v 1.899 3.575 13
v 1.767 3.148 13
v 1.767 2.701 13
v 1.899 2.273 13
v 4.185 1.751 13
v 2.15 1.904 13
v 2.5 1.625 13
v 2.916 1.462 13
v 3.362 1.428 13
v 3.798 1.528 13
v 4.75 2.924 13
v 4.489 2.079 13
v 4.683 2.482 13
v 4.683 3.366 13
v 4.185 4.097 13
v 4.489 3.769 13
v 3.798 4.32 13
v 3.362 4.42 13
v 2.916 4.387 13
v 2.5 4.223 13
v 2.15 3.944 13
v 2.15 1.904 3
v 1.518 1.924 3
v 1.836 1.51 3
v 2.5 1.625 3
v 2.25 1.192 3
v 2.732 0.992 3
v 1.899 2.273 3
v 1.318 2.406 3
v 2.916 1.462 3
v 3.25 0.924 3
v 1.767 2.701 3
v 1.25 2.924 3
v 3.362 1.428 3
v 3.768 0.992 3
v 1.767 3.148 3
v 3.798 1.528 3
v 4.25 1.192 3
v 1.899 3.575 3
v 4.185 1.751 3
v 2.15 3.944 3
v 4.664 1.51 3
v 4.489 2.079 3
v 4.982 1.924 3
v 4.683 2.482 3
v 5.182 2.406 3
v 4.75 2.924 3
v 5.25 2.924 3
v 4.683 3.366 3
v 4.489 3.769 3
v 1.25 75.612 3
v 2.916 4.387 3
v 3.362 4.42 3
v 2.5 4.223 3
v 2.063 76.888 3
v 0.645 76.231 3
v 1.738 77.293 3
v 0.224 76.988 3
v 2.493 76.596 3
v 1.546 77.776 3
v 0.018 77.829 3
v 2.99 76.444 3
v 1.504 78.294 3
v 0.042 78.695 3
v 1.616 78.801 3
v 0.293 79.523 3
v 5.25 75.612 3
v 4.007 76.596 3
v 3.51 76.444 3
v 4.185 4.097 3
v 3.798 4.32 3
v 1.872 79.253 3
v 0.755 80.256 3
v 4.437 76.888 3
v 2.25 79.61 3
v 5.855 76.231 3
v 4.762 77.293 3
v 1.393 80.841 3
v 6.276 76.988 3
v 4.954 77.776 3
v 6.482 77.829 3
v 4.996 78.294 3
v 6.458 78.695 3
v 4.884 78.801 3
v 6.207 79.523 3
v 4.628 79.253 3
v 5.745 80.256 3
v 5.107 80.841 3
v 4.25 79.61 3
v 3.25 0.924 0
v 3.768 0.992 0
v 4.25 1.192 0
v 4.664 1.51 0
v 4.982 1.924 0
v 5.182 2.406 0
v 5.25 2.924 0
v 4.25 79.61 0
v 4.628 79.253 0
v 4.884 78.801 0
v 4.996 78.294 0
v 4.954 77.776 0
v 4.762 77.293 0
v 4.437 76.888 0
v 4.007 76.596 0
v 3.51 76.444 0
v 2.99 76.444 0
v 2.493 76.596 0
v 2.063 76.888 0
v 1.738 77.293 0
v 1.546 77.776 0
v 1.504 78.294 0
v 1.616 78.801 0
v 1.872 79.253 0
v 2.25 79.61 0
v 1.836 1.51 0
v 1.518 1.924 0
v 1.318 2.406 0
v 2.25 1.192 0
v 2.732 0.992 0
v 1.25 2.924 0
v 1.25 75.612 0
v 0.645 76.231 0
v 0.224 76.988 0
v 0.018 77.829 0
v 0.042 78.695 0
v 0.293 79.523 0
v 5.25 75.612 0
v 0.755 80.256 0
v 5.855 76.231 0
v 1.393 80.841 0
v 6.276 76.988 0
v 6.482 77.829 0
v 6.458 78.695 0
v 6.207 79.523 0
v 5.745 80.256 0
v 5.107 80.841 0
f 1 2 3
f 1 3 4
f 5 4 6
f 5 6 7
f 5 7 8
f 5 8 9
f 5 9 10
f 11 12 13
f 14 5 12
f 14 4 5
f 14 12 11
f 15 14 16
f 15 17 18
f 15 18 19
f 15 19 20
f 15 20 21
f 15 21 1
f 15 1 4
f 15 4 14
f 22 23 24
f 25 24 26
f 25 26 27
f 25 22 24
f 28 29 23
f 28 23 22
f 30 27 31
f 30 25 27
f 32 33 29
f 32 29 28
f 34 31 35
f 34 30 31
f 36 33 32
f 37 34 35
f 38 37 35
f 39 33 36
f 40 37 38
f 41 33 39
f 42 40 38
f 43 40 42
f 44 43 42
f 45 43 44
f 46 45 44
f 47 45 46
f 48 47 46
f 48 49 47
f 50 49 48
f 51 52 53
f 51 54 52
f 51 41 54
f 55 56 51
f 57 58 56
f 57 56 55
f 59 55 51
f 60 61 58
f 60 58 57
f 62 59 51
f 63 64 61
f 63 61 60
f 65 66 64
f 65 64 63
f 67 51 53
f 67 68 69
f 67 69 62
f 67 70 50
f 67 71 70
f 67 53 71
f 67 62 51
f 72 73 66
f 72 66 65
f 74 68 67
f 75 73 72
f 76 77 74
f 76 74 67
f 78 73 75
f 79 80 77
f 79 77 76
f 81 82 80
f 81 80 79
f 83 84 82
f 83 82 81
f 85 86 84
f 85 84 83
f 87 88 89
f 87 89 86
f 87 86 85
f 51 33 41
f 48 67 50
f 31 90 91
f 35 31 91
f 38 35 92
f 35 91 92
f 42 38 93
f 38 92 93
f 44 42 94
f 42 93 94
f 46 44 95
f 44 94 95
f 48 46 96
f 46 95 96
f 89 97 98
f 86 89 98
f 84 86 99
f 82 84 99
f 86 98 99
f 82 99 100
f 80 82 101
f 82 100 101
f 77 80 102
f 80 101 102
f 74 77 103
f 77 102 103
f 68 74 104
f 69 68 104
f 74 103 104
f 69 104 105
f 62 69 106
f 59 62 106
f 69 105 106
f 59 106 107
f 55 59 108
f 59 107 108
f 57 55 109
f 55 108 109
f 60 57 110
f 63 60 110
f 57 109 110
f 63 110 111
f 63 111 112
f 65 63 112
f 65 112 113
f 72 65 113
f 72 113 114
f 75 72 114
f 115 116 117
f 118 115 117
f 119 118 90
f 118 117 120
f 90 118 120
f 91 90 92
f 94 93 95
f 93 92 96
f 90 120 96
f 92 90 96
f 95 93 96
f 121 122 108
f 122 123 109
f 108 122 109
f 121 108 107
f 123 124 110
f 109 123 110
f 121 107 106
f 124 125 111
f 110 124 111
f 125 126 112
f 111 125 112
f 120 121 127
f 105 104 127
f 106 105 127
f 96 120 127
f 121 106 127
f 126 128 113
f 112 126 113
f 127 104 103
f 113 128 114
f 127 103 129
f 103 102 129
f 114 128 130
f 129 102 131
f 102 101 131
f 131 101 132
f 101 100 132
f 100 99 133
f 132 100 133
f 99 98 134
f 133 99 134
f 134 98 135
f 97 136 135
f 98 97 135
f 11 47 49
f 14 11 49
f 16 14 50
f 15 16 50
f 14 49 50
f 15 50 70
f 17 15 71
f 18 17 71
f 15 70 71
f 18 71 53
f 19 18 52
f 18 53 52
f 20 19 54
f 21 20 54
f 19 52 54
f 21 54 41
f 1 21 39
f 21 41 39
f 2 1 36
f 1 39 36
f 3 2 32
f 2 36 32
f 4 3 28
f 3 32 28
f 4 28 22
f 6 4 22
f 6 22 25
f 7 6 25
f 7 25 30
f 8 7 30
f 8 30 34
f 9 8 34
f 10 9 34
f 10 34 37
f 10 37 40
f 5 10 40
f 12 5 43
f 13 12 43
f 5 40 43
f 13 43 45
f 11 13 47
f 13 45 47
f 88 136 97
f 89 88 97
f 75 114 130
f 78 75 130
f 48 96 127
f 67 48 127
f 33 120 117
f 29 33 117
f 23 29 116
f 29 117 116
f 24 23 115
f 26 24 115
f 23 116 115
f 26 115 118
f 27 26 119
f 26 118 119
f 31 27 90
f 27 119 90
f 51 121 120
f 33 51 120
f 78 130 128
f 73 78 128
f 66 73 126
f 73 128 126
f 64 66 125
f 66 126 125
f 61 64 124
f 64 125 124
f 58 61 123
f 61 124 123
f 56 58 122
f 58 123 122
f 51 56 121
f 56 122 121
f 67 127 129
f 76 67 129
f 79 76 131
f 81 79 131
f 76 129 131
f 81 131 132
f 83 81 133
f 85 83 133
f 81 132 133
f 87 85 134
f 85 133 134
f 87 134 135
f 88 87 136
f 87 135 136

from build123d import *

# Parameters (mm, degrees)
F1_DEPTH = 3
F2_R     = 1.5
F3_DEPTH = 10


# Not quite as in the source:
# - a feature names something its author has since deleted; it is built from what else it names


with BuildPart() as f1:
    # F0 (on Top) → F1 (new body)
    with BuildSketch(Plane.XY):
        with BuildLine():
            ThreePointArc((3.25, 74.9241337907), (2.1924432633, 75.1010126169), (1.25, 75.6123960992))
            Line((1.25, 75.6123960992), (1.25, 2.9241337907))
            ThreePointArc((1.25, 2.9241337907), (1.8357864376, 4.338347353), (3.25, 4.9241337907))
            Line((3.25, 4.9241337907), (3.25, 74.9241337907))
        make_face()
        with BuildLine():
            ThreePointArc((3.25, 4.9241337907), (1.8357864376, 4.338347353), (1.25, 2.9241337907))
            ThreePointArc((1.25, 2.9241337907), (1.8357864376, 1.5099202283), (3.25, 0.9241337907))
            Line((3.25, 0.9241337907), (3.25, 4.9241337907))
        make_face()
        with BuildLine():
            ThreePointArc((5.25, 75.6123960992), (4.3075567367, 75.1010126169), (3.25, 74.9241337907))
            Line((3.25, 74.9241337907), (3.25, 4.9241337907))
            ThreePointArc((3.25, 4.9241337907), (4.6642135624, 4.338347353), (5.25, 2.9241337907))
            Line((5.25, 2.9241337907), (5.25, 75.6123960992))
        make_face()
        with BuildLine():
            ThreePointArc((5.25, 2.9241337907), (4.6642135624, 4.338347353), (3.25, 4.9241337907))
            Line((3.25, 4.9241337907), (3.25, 0.9241337907))
            ThreePointArc((3.25, 0.9241337907), (4.6642135624, 1.5099202283), (5.25, 2.9241337907))
        make_face()
        with BuildLine():
            Line((2.25, 79.6102744523), (1.3928571429, 80.8412521623))
            ThreePointArc((1.3928571429, 80.8412521623), (0.0012122742, 78.2628936507), (1.25, 75.6123960992))
            ThreePointArc((1.25, 75.6123960992), (2.1924432633, 75.1010126169), (3.25, 74.9241337907))
            ThreePointArc((3.25, 74.9241337907), (4.3075567367, 75.1010126169), (5.25, 75.6123960992))
            ThreePointArc((5.25, 75.6123960992), (6.4987877258, 78.2628936507), (5.1071428571, 80.8412521623))
            Line((5.1071428571, 80.8412521623), (4.25, 79.6102744523))
            ThreePointArc((4.25, 79.6102744523), (3.25, 76.4241337907), (2.25, 79.6102744523))
        make_face()
    extrude(amount=F1_DEPTH)

    # F2 (on face) → F3 (join)
    with BuildSketch(Plane.XY.offset(3)):
        with Locations((3.25, 2.9241337907)):
            Circle(F2_R)
    extrude(amount=F3_DEPTH)


solid = f1.part
